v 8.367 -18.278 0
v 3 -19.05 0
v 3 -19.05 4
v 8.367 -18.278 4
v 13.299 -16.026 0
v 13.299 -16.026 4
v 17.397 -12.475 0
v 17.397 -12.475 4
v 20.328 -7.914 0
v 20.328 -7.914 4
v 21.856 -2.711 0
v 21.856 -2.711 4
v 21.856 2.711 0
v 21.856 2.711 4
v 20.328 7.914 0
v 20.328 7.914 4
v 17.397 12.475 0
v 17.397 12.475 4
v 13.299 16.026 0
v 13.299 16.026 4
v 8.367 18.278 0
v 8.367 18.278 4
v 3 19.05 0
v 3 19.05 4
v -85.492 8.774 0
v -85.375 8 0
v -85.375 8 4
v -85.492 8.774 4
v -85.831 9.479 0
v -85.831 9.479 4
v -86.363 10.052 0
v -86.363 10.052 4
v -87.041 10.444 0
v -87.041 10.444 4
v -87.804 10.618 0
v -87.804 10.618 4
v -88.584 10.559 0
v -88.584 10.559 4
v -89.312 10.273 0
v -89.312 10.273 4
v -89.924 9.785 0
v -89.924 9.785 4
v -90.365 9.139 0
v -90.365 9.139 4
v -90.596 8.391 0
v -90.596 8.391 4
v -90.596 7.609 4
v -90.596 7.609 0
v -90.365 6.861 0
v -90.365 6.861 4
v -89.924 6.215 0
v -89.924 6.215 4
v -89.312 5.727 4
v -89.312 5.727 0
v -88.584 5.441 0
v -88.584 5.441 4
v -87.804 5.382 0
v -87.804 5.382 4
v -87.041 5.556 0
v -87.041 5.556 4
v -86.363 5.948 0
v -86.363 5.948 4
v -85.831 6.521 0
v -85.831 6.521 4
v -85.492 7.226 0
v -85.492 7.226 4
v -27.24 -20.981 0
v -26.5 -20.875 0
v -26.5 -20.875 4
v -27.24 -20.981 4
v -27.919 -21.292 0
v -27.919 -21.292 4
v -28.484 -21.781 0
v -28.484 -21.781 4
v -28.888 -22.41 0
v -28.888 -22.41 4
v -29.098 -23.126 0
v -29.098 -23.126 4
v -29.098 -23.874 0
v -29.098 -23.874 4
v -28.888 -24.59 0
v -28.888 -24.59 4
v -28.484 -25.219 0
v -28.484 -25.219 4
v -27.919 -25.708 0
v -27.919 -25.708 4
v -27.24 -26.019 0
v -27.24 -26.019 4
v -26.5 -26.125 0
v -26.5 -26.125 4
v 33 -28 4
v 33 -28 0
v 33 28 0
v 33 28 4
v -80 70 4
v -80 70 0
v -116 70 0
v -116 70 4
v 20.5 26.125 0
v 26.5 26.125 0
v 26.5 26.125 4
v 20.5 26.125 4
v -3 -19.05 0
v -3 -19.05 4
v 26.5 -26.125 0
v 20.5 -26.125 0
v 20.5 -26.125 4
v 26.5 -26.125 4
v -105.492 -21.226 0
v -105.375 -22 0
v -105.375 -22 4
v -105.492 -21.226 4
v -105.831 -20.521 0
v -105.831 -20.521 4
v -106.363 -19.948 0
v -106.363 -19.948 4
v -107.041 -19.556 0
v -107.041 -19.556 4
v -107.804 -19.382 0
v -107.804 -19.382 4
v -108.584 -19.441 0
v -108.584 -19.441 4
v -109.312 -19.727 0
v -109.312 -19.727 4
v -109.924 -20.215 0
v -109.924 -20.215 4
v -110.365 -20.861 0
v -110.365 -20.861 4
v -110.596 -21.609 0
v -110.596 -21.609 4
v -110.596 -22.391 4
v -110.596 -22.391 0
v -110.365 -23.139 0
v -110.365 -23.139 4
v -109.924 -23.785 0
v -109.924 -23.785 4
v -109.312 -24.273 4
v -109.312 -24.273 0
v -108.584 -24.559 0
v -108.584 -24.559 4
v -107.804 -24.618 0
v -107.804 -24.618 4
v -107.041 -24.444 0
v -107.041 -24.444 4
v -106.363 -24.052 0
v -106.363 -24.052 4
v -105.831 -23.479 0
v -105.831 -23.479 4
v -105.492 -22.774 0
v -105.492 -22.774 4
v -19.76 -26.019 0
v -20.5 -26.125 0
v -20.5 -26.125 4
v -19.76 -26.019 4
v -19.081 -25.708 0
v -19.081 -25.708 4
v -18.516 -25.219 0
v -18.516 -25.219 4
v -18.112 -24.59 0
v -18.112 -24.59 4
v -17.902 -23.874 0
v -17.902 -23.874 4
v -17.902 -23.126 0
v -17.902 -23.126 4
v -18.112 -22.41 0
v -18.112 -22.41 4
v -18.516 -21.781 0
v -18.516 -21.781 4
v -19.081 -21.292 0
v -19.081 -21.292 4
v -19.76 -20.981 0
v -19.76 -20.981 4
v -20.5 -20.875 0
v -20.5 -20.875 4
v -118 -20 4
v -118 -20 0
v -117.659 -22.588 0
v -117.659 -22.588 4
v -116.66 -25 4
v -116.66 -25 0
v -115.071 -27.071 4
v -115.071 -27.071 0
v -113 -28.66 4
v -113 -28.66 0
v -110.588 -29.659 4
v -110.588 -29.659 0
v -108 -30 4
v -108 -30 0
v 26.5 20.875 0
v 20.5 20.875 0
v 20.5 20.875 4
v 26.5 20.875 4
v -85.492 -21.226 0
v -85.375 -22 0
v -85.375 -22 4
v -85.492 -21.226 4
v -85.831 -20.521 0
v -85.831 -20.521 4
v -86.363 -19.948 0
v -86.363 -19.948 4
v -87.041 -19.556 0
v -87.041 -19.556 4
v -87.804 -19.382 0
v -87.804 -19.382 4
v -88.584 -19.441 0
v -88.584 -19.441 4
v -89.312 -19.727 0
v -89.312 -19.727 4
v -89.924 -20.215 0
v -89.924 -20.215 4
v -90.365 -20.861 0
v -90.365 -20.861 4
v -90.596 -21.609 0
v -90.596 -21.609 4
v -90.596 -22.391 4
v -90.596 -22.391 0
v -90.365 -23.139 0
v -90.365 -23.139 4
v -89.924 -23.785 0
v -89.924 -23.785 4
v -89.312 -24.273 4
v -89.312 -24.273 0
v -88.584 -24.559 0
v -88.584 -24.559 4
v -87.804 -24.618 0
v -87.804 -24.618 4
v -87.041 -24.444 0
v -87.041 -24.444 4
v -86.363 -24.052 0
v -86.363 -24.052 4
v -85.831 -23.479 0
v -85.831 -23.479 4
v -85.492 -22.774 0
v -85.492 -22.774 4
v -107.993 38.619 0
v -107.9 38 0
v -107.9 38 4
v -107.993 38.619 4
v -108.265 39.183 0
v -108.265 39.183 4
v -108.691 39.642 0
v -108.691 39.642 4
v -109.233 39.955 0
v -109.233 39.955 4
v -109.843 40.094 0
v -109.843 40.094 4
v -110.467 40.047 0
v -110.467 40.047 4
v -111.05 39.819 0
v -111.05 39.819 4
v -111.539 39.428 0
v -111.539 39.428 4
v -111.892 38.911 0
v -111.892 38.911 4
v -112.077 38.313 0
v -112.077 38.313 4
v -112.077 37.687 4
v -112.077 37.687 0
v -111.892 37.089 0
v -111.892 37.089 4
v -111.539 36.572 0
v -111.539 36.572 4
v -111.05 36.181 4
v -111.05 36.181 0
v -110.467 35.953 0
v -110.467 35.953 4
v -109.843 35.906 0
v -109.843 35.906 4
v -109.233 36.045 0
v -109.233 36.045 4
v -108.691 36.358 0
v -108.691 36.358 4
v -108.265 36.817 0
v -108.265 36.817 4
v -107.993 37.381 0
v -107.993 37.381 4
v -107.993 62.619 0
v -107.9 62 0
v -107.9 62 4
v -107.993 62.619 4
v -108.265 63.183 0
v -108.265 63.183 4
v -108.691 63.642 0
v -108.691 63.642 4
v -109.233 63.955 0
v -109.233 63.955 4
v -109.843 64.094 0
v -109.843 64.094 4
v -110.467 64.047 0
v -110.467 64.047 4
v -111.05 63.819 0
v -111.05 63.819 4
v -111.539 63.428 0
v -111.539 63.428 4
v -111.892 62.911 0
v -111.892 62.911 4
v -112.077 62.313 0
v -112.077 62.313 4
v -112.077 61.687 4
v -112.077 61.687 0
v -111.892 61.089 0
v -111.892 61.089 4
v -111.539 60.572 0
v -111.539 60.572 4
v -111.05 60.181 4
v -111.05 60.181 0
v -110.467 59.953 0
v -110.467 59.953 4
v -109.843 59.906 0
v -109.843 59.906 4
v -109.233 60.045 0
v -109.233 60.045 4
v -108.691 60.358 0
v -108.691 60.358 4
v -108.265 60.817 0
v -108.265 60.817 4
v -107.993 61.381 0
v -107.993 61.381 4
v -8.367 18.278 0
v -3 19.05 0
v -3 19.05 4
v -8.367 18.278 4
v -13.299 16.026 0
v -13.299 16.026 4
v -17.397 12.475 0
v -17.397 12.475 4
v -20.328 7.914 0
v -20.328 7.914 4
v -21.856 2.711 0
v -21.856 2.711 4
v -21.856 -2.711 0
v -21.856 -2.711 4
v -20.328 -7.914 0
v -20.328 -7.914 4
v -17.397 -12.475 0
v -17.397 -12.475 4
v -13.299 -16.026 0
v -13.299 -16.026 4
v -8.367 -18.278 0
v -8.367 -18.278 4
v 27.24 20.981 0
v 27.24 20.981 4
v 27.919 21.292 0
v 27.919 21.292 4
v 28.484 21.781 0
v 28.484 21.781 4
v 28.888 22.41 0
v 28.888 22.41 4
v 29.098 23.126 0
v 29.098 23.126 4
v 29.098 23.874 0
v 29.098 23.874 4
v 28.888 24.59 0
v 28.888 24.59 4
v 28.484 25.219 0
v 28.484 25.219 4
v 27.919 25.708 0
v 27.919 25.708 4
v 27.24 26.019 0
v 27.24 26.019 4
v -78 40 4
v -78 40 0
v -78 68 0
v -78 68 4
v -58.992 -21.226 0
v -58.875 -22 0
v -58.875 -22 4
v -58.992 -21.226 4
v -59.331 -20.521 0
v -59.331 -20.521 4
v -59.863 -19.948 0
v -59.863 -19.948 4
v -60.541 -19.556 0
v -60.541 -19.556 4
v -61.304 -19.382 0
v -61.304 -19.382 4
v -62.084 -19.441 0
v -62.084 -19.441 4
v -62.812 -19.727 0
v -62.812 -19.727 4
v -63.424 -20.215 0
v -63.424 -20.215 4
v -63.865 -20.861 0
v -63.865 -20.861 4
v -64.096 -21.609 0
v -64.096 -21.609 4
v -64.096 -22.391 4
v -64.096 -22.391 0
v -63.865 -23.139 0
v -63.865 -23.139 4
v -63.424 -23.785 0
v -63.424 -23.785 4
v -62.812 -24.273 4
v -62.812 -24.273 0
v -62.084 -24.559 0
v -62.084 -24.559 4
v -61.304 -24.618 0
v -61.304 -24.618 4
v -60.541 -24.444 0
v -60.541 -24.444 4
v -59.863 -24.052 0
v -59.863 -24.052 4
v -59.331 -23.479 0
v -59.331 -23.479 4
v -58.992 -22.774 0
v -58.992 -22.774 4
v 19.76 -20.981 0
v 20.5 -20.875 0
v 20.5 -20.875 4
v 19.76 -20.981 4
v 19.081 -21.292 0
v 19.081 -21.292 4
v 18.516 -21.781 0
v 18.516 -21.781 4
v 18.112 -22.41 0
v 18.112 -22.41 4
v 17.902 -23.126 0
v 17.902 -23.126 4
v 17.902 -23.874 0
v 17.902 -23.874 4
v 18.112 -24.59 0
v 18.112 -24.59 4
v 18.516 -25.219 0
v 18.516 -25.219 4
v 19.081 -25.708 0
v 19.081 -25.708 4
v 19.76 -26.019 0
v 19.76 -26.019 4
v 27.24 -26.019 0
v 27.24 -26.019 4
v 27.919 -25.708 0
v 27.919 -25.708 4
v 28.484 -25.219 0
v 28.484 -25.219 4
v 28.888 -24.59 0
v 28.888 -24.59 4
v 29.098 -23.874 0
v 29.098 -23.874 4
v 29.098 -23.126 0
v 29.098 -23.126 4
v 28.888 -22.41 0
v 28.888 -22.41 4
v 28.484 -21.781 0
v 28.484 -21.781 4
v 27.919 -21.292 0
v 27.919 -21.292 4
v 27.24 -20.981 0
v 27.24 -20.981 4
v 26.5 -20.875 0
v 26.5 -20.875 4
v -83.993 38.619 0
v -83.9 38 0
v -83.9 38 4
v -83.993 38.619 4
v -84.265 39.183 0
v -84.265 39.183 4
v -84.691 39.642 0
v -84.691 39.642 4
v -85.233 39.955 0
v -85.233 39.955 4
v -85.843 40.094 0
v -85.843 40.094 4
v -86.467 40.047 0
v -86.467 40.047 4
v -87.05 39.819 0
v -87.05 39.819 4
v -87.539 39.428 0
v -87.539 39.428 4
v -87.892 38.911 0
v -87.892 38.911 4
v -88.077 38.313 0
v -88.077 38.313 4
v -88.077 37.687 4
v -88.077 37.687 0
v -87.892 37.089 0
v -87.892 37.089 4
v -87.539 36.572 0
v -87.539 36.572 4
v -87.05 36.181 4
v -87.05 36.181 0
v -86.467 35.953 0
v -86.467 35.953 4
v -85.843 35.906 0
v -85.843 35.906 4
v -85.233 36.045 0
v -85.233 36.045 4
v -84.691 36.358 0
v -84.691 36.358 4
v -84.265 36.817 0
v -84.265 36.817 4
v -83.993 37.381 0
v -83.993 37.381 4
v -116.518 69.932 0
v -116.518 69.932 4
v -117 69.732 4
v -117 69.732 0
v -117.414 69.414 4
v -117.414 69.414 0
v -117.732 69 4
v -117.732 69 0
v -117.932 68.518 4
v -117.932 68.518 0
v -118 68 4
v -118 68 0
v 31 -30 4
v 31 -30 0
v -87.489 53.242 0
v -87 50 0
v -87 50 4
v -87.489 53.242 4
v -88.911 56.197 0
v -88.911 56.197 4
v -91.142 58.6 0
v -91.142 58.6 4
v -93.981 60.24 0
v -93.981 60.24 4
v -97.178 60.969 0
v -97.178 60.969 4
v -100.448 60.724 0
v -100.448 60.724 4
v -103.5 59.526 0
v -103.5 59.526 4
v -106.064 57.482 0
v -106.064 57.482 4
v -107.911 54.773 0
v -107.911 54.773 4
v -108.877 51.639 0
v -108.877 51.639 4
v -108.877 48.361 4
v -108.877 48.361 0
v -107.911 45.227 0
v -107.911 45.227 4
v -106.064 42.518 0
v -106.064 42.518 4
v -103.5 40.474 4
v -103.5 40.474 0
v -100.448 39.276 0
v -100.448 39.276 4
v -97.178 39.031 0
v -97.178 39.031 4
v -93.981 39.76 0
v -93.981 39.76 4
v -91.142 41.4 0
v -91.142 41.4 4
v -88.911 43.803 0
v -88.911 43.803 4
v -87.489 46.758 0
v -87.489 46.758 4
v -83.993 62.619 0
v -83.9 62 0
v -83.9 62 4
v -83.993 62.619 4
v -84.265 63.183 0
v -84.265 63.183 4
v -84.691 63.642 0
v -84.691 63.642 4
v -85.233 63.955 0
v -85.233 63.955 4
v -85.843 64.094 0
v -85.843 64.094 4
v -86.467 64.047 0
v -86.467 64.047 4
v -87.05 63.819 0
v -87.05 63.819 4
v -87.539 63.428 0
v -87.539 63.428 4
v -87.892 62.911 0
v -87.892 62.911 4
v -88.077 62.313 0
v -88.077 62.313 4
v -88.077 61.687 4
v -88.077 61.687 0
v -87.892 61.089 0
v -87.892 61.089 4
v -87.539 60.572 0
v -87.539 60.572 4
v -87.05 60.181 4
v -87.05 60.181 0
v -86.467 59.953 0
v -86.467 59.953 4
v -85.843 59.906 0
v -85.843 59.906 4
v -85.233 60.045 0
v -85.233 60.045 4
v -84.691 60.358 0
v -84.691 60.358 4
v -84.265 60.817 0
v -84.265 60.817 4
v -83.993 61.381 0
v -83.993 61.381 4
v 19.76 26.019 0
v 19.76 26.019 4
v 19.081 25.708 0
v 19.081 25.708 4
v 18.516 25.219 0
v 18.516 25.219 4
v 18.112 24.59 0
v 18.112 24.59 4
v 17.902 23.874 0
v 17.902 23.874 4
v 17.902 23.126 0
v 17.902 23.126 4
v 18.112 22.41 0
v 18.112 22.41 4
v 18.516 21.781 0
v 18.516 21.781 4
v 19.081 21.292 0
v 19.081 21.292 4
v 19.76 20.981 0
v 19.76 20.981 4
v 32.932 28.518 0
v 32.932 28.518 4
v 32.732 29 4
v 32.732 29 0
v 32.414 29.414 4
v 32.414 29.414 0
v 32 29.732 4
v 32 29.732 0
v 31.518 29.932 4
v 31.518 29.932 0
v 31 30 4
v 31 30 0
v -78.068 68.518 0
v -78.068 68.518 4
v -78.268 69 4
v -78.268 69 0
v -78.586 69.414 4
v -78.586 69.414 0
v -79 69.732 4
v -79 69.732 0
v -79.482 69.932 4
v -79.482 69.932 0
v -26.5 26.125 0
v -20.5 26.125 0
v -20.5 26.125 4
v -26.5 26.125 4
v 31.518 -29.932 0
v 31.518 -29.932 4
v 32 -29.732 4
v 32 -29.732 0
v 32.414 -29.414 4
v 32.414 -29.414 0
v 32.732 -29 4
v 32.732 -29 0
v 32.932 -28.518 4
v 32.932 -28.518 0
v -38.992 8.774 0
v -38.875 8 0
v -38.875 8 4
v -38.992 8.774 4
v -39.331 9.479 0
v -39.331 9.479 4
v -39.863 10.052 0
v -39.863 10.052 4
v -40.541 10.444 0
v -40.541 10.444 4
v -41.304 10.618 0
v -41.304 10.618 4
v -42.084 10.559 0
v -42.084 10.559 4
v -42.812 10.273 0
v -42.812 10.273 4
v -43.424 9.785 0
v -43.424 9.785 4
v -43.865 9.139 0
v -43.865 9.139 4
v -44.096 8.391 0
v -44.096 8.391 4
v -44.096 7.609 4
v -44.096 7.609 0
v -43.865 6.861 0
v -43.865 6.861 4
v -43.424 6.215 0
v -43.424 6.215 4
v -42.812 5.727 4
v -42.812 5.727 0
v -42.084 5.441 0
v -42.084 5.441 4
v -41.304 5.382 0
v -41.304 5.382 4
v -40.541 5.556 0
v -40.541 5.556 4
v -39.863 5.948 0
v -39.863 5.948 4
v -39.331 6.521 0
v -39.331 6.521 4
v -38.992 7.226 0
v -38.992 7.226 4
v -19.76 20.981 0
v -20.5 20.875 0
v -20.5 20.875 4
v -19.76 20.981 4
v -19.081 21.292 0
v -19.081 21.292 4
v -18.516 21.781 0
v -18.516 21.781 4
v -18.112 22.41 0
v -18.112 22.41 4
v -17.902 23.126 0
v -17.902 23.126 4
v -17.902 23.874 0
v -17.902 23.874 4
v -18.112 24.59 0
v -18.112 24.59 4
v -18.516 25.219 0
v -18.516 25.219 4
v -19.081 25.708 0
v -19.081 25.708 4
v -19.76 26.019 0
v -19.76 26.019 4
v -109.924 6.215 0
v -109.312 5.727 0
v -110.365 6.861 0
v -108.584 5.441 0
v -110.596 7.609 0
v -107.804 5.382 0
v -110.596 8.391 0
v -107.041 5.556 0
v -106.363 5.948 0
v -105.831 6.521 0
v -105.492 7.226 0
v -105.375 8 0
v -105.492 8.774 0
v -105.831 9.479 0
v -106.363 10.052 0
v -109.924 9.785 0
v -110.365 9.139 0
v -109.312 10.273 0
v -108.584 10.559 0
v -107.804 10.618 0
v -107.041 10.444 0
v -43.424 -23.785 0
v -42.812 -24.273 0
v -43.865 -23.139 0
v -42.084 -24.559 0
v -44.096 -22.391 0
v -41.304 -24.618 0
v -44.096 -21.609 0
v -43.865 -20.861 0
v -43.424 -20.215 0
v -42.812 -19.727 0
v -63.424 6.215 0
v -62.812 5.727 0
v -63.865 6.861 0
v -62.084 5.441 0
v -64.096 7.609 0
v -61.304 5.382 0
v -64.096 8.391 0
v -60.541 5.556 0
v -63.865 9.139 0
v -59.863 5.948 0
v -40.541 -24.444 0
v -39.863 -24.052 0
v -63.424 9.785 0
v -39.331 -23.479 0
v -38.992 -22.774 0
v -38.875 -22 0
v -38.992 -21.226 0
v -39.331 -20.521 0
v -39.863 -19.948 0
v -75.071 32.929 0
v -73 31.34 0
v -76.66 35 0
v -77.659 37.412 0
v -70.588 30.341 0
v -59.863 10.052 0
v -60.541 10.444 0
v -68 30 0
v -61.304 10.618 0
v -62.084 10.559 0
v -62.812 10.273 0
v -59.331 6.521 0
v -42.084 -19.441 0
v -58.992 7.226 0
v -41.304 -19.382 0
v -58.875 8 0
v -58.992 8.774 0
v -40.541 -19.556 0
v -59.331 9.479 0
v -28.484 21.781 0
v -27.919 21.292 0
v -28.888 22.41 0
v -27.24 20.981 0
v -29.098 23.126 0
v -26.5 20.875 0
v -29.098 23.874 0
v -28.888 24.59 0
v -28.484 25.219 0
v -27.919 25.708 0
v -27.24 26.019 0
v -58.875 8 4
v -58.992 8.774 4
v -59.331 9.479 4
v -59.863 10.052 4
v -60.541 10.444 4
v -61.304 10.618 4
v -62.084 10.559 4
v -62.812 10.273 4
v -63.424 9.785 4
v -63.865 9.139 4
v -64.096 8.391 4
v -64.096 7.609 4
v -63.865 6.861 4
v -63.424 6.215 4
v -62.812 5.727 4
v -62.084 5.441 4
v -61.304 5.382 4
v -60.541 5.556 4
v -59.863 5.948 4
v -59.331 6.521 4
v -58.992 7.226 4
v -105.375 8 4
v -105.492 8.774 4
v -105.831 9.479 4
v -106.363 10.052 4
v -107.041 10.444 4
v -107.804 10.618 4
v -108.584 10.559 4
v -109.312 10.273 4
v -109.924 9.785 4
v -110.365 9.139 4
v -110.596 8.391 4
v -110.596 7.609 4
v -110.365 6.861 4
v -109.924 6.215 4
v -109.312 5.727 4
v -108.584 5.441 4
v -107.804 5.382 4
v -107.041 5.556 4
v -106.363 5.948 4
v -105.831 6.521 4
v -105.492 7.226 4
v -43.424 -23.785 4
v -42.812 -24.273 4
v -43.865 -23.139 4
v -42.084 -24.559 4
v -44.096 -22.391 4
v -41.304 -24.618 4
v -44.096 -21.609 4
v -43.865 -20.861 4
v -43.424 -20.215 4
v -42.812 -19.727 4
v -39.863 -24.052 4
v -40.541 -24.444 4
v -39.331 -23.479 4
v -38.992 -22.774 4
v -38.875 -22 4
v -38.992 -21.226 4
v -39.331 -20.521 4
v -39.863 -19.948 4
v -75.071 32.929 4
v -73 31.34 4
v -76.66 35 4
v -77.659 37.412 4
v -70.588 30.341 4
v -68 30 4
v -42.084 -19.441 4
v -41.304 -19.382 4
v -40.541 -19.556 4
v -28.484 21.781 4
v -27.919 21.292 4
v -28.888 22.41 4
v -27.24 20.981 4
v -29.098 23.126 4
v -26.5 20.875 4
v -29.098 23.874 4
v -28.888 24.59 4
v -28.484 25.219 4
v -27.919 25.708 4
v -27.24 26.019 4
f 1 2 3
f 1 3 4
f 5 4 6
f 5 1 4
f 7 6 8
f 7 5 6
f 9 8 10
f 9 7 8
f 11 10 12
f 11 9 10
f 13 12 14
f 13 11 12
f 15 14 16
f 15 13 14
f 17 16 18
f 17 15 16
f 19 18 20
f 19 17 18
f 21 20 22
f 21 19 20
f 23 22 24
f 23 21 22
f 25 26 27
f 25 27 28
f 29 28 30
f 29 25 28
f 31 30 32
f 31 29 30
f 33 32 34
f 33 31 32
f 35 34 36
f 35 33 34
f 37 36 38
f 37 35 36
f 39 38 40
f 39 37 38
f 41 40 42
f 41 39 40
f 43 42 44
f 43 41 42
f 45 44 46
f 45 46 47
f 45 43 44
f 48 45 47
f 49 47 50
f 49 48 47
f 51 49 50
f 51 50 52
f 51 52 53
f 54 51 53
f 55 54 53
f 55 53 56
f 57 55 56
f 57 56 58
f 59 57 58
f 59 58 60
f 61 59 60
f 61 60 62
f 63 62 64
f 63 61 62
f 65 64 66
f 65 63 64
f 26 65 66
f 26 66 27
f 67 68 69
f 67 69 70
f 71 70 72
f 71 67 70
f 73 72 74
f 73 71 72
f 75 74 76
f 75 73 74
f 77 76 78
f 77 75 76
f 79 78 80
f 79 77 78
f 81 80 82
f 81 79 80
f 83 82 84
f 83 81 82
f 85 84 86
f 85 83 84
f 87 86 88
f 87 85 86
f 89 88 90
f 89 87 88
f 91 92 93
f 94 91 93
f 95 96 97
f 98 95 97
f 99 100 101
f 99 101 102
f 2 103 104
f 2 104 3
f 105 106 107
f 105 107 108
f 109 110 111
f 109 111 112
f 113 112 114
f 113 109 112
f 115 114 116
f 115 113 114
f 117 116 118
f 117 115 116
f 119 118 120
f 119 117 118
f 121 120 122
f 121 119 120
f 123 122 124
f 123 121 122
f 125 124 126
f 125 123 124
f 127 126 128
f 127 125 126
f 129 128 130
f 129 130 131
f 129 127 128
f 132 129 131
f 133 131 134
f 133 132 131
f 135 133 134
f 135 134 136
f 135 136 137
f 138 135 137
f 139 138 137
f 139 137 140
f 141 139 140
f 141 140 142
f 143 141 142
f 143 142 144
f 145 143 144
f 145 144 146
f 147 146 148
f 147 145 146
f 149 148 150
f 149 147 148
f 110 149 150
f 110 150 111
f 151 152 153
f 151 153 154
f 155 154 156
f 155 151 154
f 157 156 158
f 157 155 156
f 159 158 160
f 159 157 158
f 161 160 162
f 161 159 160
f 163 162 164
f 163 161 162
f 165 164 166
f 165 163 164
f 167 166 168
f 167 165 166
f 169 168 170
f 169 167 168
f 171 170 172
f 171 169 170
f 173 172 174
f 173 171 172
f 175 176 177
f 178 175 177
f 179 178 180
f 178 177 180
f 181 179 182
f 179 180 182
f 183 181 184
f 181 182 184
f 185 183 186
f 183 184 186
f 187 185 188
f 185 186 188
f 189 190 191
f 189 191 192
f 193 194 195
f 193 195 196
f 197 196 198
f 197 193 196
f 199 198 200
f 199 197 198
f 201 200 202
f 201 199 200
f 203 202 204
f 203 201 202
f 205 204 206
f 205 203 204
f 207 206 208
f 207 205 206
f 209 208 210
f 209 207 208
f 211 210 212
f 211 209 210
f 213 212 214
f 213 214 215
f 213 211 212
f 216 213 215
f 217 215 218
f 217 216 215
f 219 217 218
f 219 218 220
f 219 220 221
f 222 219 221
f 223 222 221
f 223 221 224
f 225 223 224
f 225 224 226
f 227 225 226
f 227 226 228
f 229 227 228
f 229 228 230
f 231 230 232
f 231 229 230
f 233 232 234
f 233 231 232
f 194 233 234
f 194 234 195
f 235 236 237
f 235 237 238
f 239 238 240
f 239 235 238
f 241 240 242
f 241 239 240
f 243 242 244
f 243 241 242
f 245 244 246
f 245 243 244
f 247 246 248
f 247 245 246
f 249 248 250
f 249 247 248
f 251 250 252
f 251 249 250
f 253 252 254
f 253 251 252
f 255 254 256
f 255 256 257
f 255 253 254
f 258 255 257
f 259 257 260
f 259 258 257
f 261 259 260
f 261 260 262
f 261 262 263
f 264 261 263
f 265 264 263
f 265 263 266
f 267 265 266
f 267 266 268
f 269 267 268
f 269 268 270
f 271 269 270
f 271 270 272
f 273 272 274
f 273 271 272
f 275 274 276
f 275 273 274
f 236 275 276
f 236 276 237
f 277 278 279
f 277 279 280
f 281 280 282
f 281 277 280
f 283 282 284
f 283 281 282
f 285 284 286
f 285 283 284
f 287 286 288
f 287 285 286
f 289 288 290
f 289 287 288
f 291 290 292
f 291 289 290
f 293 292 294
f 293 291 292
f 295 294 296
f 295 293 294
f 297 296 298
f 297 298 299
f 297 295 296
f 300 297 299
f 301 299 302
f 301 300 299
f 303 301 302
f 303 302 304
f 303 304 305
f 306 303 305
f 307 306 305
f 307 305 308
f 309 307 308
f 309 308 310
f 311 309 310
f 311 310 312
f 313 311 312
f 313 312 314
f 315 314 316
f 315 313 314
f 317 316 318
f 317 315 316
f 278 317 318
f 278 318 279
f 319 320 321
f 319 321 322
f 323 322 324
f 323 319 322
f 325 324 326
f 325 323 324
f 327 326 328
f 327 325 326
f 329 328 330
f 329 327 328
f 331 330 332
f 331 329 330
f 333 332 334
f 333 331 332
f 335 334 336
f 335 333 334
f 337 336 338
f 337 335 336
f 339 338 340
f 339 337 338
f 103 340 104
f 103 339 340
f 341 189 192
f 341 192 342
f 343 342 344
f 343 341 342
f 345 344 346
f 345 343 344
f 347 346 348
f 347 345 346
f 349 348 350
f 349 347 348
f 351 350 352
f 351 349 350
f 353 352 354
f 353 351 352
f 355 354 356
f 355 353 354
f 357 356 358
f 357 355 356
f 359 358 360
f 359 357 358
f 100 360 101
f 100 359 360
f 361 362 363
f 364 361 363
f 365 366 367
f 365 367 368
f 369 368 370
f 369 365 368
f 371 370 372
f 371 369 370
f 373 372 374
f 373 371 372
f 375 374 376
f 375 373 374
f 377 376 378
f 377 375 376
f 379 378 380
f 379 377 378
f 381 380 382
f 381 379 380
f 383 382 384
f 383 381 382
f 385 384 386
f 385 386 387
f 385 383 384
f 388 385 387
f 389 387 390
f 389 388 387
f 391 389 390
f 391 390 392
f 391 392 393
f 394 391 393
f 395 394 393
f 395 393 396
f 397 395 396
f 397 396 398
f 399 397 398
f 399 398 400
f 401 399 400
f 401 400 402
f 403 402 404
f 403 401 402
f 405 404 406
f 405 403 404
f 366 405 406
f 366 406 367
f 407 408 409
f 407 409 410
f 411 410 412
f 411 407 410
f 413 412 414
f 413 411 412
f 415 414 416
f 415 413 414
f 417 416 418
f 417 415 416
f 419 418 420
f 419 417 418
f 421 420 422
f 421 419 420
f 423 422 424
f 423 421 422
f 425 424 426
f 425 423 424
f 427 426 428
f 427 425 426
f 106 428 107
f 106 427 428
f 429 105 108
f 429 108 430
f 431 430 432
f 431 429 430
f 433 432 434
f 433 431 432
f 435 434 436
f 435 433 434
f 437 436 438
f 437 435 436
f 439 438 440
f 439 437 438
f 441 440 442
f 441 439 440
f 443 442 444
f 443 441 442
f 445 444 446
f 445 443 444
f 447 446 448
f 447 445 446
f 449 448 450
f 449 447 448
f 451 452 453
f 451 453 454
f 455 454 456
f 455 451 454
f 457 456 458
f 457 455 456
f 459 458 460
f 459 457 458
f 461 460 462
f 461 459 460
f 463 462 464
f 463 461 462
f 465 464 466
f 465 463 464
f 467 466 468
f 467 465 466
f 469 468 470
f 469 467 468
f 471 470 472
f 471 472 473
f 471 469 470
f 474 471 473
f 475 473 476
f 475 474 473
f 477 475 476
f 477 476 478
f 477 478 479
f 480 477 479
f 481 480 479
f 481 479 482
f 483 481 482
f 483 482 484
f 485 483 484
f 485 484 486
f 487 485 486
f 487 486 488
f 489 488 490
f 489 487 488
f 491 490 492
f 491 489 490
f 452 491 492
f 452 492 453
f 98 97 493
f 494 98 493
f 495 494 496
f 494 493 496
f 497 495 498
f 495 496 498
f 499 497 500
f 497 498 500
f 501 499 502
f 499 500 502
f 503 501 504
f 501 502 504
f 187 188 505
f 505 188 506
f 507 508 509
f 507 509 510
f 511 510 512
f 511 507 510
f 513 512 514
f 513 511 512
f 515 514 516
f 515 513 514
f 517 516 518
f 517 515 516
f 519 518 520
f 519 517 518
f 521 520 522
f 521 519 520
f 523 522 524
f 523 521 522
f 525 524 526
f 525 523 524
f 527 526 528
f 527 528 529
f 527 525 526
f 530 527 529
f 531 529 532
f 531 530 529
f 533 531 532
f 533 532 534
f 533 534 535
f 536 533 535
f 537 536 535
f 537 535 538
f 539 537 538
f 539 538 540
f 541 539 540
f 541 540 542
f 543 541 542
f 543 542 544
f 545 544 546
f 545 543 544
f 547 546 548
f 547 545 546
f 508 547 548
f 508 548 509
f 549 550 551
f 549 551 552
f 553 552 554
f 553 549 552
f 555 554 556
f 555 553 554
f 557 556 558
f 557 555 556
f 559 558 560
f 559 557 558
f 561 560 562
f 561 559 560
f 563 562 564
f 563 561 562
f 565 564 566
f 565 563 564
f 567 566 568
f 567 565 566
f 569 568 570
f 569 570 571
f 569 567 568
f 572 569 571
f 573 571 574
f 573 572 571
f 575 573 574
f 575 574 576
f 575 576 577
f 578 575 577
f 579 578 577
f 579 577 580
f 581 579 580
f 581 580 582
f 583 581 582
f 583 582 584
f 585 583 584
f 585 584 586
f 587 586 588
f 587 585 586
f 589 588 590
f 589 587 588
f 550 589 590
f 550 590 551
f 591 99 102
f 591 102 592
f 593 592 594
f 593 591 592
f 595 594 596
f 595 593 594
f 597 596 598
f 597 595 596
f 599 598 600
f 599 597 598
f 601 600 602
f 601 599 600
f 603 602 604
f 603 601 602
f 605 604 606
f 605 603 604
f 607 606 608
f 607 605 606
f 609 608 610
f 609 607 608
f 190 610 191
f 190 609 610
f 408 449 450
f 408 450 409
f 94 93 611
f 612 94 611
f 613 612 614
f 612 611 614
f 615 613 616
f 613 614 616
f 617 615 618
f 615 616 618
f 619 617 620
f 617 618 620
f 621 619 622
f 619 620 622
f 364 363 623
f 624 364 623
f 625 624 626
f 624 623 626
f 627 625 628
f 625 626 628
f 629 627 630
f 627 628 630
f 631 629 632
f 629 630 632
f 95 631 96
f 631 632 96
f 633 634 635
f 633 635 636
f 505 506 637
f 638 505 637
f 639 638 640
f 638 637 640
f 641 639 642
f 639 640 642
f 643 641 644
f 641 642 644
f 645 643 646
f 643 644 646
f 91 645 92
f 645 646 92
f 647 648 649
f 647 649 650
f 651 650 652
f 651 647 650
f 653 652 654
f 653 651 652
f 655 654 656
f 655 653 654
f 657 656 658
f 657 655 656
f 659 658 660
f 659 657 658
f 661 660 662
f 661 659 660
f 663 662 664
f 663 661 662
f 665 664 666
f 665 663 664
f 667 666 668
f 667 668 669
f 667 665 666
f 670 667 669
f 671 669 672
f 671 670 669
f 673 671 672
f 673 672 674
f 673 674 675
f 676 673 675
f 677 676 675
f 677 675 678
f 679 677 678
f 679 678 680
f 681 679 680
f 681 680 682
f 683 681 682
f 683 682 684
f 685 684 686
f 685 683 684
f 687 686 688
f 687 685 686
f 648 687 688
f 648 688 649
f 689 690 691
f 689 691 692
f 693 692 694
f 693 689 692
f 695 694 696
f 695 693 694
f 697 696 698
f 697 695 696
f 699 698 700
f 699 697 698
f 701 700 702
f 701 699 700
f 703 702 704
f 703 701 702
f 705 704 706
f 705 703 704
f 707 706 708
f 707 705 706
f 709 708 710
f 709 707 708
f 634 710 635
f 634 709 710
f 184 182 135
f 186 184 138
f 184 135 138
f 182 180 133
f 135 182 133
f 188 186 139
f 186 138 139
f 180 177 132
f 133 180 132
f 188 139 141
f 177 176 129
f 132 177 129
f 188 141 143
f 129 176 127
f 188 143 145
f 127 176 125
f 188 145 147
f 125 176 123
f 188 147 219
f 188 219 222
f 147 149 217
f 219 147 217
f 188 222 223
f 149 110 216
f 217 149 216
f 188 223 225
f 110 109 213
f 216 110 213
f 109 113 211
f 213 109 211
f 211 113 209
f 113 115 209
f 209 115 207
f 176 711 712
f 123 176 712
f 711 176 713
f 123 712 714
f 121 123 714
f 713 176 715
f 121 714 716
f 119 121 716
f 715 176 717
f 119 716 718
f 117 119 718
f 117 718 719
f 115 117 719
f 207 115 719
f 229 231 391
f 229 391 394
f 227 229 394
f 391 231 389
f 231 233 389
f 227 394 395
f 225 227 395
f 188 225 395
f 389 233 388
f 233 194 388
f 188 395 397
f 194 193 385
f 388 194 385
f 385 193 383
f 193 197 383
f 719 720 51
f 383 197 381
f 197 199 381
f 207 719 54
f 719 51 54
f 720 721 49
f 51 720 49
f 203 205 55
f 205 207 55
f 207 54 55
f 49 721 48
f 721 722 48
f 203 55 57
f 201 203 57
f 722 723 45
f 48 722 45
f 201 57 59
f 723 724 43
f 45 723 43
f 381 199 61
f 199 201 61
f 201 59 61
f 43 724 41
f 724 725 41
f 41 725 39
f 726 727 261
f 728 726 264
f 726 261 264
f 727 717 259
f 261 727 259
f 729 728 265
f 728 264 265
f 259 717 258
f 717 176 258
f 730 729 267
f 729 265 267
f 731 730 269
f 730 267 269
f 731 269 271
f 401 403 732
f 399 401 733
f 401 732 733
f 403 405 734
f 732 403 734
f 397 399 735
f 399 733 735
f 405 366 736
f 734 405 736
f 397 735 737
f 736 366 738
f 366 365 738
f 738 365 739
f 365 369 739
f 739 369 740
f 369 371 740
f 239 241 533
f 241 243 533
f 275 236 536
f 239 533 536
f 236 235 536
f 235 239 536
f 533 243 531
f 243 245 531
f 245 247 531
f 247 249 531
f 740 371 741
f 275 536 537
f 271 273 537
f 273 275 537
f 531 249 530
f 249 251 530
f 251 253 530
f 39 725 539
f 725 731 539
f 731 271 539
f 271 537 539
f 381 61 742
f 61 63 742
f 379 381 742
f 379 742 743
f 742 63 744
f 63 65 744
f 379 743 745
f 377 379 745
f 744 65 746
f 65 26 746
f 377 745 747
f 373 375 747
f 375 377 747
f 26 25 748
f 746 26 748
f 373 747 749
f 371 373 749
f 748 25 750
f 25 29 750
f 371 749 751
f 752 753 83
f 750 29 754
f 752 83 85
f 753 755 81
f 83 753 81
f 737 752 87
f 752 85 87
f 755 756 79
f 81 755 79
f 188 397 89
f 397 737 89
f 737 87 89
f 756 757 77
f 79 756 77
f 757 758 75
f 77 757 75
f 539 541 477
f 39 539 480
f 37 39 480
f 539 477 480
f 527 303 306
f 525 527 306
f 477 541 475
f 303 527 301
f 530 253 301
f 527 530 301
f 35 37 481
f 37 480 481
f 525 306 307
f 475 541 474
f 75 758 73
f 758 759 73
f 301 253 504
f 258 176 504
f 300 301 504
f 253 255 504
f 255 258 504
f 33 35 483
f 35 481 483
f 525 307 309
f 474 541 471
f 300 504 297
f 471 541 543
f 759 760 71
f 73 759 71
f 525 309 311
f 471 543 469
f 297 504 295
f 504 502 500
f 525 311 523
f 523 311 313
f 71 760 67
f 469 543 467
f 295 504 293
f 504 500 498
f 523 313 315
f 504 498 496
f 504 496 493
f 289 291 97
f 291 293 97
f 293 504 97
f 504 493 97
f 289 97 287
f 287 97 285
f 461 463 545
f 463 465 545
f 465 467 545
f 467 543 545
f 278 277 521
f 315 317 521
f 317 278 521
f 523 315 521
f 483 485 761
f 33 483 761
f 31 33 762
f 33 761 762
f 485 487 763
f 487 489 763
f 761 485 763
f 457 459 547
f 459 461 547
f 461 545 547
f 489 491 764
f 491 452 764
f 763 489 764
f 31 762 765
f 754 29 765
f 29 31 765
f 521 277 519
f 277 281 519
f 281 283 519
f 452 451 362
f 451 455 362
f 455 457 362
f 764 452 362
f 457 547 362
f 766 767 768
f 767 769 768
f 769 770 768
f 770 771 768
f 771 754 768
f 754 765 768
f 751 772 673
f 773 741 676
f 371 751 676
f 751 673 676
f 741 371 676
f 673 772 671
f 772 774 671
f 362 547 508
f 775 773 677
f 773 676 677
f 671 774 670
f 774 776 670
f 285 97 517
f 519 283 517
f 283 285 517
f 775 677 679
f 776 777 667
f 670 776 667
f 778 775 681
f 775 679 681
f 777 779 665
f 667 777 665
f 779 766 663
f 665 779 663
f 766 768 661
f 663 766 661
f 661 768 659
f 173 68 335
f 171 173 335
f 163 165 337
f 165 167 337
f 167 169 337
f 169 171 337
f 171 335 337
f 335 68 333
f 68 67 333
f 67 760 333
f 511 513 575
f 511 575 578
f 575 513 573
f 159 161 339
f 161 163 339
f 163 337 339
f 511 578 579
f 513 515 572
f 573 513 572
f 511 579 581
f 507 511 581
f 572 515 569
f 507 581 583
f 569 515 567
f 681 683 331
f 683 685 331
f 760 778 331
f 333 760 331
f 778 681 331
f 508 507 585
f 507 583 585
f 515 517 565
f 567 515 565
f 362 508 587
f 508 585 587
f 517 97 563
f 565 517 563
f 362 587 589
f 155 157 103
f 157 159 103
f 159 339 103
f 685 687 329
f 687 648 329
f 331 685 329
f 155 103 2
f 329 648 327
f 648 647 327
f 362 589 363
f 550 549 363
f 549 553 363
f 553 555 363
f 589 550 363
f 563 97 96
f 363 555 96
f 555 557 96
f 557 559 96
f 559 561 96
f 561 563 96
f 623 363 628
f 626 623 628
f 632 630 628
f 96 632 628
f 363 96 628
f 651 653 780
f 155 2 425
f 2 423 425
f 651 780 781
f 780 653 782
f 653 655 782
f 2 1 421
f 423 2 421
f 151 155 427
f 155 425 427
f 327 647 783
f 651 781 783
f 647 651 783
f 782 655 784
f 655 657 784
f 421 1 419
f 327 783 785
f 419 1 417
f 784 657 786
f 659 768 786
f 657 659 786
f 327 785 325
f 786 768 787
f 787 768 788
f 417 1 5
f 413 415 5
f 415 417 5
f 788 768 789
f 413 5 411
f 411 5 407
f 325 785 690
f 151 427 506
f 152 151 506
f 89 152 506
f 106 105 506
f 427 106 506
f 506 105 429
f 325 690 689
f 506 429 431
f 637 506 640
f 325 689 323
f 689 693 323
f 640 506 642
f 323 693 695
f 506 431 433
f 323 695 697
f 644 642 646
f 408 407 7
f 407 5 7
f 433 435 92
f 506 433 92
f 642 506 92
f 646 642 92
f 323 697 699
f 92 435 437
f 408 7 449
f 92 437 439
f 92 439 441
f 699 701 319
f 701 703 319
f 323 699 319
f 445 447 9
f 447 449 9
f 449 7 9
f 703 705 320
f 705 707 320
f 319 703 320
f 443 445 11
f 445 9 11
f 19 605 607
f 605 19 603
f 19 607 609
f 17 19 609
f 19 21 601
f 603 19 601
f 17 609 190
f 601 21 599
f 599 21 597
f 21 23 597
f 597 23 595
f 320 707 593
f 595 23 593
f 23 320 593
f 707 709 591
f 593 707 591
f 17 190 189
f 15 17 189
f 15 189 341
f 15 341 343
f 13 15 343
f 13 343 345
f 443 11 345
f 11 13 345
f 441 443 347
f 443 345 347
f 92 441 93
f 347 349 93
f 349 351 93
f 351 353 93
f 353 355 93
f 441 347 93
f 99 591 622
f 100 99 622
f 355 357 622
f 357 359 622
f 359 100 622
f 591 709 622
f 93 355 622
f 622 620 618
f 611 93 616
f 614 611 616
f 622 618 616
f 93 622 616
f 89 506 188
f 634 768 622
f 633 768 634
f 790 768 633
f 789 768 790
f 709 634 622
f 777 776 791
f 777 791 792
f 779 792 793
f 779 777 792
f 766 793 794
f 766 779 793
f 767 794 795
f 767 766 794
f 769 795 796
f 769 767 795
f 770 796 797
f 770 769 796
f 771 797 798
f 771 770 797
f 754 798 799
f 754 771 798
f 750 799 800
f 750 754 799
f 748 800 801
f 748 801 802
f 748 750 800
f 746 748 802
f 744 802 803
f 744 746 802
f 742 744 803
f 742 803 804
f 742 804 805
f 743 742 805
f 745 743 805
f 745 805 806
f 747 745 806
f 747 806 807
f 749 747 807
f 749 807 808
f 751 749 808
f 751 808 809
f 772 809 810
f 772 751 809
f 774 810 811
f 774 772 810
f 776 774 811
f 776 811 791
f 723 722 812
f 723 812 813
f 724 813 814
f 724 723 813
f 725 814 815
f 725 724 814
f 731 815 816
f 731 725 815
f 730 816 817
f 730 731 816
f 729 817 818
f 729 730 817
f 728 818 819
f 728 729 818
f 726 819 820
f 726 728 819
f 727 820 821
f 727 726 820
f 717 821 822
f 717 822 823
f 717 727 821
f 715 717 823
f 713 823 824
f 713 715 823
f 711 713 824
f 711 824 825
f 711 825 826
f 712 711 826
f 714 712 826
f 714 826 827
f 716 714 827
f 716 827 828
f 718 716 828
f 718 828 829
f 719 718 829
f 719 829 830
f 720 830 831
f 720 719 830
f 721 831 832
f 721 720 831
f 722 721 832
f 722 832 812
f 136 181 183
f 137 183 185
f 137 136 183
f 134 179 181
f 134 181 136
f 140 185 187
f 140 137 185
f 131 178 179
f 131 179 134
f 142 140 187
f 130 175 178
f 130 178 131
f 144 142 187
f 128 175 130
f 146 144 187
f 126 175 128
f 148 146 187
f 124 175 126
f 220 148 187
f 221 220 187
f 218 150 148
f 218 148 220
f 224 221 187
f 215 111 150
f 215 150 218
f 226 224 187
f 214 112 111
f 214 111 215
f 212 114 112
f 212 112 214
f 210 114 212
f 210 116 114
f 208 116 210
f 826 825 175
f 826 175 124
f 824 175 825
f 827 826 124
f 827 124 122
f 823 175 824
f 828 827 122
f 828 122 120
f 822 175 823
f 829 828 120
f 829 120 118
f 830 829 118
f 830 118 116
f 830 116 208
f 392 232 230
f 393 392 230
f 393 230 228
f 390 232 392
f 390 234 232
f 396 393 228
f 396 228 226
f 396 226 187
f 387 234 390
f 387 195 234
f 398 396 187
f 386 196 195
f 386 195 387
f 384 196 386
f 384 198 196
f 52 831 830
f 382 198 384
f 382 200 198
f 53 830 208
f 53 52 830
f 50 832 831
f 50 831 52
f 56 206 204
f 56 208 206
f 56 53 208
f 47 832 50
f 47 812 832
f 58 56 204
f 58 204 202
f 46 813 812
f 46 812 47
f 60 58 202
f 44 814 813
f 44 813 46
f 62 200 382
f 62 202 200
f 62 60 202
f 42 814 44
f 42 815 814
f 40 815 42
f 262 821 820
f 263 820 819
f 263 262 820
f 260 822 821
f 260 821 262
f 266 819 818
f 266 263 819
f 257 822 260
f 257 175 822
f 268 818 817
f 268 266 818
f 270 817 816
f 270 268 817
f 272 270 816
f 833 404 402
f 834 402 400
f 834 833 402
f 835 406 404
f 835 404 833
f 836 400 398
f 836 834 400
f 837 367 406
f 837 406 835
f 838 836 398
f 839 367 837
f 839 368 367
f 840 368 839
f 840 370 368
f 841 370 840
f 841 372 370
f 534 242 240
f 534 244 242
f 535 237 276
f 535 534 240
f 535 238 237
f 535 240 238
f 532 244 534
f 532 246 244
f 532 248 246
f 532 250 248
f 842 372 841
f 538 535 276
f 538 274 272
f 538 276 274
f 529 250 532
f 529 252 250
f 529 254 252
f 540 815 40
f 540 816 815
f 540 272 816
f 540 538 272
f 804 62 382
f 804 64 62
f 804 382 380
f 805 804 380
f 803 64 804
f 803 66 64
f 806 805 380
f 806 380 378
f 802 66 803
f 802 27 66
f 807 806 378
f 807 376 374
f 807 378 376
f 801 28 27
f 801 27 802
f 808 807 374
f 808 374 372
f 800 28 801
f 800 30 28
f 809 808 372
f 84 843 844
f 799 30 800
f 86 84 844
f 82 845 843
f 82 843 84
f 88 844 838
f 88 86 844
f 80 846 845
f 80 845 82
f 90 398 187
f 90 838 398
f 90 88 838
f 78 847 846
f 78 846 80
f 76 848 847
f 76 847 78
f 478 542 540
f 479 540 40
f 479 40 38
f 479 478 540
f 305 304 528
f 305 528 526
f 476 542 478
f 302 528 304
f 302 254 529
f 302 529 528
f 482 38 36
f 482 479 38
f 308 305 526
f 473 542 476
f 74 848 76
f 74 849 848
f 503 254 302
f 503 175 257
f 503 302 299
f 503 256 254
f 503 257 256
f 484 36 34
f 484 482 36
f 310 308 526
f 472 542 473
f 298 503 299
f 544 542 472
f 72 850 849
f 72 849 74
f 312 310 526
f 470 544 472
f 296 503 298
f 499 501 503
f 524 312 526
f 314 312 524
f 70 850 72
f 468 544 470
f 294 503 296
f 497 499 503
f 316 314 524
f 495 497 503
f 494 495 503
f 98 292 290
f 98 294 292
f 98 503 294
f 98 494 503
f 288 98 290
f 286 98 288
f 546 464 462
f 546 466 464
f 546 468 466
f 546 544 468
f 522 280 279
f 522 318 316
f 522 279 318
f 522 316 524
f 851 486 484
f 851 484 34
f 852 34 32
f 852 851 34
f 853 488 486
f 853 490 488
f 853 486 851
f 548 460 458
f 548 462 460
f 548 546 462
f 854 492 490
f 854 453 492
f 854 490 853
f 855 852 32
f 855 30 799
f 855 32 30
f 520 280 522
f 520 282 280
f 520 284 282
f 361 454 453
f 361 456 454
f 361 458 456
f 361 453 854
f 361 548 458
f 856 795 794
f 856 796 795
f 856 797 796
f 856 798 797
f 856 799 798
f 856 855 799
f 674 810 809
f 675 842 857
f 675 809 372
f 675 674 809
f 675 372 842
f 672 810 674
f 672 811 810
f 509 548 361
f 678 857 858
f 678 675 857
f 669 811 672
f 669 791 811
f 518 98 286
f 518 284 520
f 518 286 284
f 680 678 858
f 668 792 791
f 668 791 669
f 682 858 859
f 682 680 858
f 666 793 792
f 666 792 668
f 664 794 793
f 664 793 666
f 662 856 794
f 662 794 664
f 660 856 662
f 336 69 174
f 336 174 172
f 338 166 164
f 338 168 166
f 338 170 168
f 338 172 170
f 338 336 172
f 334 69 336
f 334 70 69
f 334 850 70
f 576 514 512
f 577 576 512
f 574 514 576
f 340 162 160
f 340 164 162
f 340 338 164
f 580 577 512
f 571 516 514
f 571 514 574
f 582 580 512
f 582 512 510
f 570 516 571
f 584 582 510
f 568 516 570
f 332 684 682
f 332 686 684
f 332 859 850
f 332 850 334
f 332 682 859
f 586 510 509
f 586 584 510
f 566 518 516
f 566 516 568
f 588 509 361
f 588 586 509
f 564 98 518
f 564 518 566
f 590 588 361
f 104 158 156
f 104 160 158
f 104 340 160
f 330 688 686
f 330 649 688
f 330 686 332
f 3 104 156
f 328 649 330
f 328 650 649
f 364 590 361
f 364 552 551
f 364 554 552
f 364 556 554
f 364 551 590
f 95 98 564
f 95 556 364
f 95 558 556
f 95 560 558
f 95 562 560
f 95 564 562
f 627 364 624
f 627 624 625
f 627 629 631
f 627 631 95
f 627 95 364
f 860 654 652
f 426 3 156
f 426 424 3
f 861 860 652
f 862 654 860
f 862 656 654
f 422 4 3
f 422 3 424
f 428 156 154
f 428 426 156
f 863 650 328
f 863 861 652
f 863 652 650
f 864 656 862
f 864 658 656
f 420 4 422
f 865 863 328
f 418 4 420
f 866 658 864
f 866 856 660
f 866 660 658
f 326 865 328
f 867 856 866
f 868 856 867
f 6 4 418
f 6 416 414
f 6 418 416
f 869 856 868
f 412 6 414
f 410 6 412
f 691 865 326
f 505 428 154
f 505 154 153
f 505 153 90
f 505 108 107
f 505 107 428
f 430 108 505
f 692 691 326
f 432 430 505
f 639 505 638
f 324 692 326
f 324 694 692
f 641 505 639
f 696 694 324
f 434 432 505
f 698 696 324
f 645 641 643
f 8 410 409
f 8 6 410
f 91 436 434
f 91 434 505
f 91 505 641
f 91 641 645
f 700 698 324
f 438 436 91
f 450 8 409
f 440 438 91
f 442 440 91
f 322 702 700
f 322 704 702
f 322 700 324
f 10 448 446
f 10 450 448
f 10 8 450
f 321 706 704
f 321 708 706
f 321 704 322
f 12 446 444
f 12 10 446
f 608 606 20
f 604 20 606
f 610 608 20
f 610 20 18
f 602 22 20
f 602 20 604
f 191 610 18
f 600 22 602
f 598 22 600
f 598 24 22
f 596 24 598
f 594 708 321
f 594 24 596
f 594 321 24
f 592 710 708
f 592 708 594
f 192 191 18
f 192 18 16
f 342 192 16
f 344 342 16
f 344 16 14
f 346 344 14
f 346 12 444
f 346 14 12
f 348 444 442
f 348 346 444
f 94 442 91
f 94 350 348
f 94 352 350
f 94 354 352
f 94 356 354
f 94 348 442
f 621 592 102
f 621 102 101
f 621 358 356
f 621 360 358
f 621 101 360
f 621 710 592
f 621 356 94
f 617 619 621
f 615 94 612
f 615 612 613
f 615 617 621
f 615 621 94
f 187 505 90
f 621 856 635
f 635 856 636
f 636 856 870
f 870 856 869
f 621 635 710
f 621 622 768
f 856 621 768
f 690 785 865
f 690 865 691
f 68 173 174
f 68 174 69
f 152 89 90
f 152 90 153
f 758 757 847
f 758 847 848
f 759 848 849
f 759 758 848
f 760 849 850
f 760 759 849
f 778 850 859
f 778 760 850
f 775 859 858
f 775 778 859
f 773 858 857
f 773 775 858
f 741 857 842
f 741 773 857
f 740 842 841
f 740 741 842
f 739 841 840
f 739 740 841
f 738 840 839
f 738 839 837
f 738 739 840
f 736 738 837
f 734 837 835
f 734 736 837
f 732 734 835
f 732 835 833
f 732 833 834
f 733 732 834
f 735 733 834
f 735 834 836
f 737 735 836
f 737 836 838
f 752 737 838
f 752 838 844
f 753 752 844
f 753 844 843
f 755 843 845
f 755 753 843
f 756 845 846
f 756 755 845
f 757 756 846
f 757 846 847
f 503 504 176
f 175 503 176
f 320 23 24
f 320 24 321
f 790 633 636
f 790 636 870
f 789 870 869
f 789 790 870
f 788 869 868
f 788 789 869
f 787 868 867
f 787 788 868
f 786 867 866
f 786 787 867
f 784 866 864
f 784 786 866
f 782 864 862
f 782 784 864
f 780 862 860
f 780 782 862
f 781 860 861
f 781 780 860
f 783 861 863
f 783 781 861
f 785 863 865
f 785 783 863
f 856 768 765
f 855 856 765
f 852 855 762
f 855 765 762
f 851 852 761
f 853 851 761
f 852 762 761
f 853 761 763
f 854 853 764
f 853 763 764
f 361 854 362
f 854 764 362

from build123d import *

# Parameters (mm, degrees)
MODEL_R         = 11
MODEL_R_2       = 2.1
MODEL_R_3       = 2.625
EXTRUDE_1_DEPTH = 4


with BuildPart() as part:
    # Model → 凸台-拉伸1 (new body)
    with BuildSketch(Plane.XY):
        with BuildLine():
            Line((-80, 70), (-116, 70))
            ThreePointArc((-116, 70), (-117.414213562, 69.414213562), (-118, 68))
            Line((-118, 68), (-118, -20))
            ThreePointArc((-118, -20), (-115.071067812, -27.071067812), (-108, -30))
            Line((-108, -30), (31, -30))
            ThreePointArc((31, -30), (32.414213562, -29.414213562), (33, -28))
            Line((33, -28), (33, 28))
            ThreePointArc((33, 28), (32.414213562, 29.414213562), (31, 30))
            Line((31, 30), (-68, 30))
            ThreePointArc((-68, 30), (-75.071067812, 32.928932188), (-78, 40))
            Line((-78, 40), (-78, 68))
            ThreePointArc((-78, 68), (-78.585786438, 69.414213562), (-80, 70))
        make_face()
        with Locations((-98, 50)):
            Circle(MODEL_R, mode=Mode.SUBTRACT)
        with Locations((-110, 62)):
            Circle(MODEL_R_2, mode=Mode.SUBTRACT)
        with Locations((-86, 62)):
            Circle(MODEL_R_2, mode=Mode.SUBTRACT)
        with Locations((-110, 38)):
            Circle(MODEL_R_2, mode=Mode.SUBTRACT)
        with Locations((-86, 38)):
            Circle(MODEL_R_2, mode=Mode.SUBTRACT)
        with Locations((-61.5, 8)):
            Circle(MODEL_R_3, mode=Mode.SUBTRACT)
        with Locations((-41.5, 8)):
            Circle(MODEL_R_3, mode=Mode.SUBTRACT)
        with Locations((-41.5, -22)):
            Circle(MODEL_R_3, mode=Mode.SUBTRACT)
        with Locations((-61.5, -22)):
            Circle(MODEL_R_3, mode=Mode.SUBTRACT)
        with Locations((-108, 8)):
            Circle(MODEL_R_3, mode=Mode.SUBTRACT)
        with Locations((-88, 8)):
            Circle(MODEL_R_3, mode=Mode.SUBTRACT)
        with Locations((-108, -22)):
            Circle(MODEL_R_3, mode=Mode.SUBTRACT)
        with Locations((-88, -22)):
            Circle(MODEL_R_3, mode=Mode.SUBTRACT)
        with BuildLine():
            Line((-20.5, -20.875), (-26.5, -20.875))
            ThreePointArc((-26.5, -20.875), (-29.125, -23.5), (-26.5, -26.125))
            Line((-26.5, -26.125), (-20.5, -26.125))
            ThreePointArc((-20.5, -26.125), (-17.875, -23.5), (-20.5, -20.875))
        make_face(mode=Mode.SUBTRACT)
        with BuildLine():
            Line((20.5, 20.875), (26.5, 20.875))
            ThreePointArc((26.5, 20.875), (29.125, 23.5), (26.5, 26.125))
            Line((26.5, 26.125), (20.5, 26.125))
            ThreePointArc((20.5, 26.125), (17.875, 23.5), (20.5, 20.875))
        make_face(mode=Mode.SUBTRACT)
        with BuildLine():
            Line((-3, -19.05), (3, -19.05))
            ThreePointArc((3, -19.05), (22.05, 0), (3, 19.05))
            Line((3, 19.05), (-3, 19.05))
            ThreePointArc((-3, 19.05), (-22.05, 0), (-3, -19.05))
        make_face(mode=Mode.SUBTRACT)
        with BuildLine():
            Line((-26.5, 20.875), (-20.5, 20.875))
            ThreePointArc((-20.5, 20.875), (-17.875, 23.5), (-20.5, 26.125))
            Line((-20.5, 26.125), (-26.5, 26.125))
            ThreePointArc((-26.5, 26.125), (-29.125, 23.5), (-26.5, 20.875))
        make_face(mode=Mode.SUBTRACT)
        with BuildLine():
            Line((26.5, -20.875), (20.5, -20.875))
            ThreePointArc((20.5, -20.875), (17.875, -23.5), (20.5, -26.125))
            Line((20.5, -26.125), (26.5, -26.125))
            ThreePointArc((26.5, -26.125), (29.125, -23.5), (26.5, -20.875))
        make_face(mode=Mode.SUBTRACT)
    extrude(amount=EXTRUDE_1_DEPTH)


solid = part.part
